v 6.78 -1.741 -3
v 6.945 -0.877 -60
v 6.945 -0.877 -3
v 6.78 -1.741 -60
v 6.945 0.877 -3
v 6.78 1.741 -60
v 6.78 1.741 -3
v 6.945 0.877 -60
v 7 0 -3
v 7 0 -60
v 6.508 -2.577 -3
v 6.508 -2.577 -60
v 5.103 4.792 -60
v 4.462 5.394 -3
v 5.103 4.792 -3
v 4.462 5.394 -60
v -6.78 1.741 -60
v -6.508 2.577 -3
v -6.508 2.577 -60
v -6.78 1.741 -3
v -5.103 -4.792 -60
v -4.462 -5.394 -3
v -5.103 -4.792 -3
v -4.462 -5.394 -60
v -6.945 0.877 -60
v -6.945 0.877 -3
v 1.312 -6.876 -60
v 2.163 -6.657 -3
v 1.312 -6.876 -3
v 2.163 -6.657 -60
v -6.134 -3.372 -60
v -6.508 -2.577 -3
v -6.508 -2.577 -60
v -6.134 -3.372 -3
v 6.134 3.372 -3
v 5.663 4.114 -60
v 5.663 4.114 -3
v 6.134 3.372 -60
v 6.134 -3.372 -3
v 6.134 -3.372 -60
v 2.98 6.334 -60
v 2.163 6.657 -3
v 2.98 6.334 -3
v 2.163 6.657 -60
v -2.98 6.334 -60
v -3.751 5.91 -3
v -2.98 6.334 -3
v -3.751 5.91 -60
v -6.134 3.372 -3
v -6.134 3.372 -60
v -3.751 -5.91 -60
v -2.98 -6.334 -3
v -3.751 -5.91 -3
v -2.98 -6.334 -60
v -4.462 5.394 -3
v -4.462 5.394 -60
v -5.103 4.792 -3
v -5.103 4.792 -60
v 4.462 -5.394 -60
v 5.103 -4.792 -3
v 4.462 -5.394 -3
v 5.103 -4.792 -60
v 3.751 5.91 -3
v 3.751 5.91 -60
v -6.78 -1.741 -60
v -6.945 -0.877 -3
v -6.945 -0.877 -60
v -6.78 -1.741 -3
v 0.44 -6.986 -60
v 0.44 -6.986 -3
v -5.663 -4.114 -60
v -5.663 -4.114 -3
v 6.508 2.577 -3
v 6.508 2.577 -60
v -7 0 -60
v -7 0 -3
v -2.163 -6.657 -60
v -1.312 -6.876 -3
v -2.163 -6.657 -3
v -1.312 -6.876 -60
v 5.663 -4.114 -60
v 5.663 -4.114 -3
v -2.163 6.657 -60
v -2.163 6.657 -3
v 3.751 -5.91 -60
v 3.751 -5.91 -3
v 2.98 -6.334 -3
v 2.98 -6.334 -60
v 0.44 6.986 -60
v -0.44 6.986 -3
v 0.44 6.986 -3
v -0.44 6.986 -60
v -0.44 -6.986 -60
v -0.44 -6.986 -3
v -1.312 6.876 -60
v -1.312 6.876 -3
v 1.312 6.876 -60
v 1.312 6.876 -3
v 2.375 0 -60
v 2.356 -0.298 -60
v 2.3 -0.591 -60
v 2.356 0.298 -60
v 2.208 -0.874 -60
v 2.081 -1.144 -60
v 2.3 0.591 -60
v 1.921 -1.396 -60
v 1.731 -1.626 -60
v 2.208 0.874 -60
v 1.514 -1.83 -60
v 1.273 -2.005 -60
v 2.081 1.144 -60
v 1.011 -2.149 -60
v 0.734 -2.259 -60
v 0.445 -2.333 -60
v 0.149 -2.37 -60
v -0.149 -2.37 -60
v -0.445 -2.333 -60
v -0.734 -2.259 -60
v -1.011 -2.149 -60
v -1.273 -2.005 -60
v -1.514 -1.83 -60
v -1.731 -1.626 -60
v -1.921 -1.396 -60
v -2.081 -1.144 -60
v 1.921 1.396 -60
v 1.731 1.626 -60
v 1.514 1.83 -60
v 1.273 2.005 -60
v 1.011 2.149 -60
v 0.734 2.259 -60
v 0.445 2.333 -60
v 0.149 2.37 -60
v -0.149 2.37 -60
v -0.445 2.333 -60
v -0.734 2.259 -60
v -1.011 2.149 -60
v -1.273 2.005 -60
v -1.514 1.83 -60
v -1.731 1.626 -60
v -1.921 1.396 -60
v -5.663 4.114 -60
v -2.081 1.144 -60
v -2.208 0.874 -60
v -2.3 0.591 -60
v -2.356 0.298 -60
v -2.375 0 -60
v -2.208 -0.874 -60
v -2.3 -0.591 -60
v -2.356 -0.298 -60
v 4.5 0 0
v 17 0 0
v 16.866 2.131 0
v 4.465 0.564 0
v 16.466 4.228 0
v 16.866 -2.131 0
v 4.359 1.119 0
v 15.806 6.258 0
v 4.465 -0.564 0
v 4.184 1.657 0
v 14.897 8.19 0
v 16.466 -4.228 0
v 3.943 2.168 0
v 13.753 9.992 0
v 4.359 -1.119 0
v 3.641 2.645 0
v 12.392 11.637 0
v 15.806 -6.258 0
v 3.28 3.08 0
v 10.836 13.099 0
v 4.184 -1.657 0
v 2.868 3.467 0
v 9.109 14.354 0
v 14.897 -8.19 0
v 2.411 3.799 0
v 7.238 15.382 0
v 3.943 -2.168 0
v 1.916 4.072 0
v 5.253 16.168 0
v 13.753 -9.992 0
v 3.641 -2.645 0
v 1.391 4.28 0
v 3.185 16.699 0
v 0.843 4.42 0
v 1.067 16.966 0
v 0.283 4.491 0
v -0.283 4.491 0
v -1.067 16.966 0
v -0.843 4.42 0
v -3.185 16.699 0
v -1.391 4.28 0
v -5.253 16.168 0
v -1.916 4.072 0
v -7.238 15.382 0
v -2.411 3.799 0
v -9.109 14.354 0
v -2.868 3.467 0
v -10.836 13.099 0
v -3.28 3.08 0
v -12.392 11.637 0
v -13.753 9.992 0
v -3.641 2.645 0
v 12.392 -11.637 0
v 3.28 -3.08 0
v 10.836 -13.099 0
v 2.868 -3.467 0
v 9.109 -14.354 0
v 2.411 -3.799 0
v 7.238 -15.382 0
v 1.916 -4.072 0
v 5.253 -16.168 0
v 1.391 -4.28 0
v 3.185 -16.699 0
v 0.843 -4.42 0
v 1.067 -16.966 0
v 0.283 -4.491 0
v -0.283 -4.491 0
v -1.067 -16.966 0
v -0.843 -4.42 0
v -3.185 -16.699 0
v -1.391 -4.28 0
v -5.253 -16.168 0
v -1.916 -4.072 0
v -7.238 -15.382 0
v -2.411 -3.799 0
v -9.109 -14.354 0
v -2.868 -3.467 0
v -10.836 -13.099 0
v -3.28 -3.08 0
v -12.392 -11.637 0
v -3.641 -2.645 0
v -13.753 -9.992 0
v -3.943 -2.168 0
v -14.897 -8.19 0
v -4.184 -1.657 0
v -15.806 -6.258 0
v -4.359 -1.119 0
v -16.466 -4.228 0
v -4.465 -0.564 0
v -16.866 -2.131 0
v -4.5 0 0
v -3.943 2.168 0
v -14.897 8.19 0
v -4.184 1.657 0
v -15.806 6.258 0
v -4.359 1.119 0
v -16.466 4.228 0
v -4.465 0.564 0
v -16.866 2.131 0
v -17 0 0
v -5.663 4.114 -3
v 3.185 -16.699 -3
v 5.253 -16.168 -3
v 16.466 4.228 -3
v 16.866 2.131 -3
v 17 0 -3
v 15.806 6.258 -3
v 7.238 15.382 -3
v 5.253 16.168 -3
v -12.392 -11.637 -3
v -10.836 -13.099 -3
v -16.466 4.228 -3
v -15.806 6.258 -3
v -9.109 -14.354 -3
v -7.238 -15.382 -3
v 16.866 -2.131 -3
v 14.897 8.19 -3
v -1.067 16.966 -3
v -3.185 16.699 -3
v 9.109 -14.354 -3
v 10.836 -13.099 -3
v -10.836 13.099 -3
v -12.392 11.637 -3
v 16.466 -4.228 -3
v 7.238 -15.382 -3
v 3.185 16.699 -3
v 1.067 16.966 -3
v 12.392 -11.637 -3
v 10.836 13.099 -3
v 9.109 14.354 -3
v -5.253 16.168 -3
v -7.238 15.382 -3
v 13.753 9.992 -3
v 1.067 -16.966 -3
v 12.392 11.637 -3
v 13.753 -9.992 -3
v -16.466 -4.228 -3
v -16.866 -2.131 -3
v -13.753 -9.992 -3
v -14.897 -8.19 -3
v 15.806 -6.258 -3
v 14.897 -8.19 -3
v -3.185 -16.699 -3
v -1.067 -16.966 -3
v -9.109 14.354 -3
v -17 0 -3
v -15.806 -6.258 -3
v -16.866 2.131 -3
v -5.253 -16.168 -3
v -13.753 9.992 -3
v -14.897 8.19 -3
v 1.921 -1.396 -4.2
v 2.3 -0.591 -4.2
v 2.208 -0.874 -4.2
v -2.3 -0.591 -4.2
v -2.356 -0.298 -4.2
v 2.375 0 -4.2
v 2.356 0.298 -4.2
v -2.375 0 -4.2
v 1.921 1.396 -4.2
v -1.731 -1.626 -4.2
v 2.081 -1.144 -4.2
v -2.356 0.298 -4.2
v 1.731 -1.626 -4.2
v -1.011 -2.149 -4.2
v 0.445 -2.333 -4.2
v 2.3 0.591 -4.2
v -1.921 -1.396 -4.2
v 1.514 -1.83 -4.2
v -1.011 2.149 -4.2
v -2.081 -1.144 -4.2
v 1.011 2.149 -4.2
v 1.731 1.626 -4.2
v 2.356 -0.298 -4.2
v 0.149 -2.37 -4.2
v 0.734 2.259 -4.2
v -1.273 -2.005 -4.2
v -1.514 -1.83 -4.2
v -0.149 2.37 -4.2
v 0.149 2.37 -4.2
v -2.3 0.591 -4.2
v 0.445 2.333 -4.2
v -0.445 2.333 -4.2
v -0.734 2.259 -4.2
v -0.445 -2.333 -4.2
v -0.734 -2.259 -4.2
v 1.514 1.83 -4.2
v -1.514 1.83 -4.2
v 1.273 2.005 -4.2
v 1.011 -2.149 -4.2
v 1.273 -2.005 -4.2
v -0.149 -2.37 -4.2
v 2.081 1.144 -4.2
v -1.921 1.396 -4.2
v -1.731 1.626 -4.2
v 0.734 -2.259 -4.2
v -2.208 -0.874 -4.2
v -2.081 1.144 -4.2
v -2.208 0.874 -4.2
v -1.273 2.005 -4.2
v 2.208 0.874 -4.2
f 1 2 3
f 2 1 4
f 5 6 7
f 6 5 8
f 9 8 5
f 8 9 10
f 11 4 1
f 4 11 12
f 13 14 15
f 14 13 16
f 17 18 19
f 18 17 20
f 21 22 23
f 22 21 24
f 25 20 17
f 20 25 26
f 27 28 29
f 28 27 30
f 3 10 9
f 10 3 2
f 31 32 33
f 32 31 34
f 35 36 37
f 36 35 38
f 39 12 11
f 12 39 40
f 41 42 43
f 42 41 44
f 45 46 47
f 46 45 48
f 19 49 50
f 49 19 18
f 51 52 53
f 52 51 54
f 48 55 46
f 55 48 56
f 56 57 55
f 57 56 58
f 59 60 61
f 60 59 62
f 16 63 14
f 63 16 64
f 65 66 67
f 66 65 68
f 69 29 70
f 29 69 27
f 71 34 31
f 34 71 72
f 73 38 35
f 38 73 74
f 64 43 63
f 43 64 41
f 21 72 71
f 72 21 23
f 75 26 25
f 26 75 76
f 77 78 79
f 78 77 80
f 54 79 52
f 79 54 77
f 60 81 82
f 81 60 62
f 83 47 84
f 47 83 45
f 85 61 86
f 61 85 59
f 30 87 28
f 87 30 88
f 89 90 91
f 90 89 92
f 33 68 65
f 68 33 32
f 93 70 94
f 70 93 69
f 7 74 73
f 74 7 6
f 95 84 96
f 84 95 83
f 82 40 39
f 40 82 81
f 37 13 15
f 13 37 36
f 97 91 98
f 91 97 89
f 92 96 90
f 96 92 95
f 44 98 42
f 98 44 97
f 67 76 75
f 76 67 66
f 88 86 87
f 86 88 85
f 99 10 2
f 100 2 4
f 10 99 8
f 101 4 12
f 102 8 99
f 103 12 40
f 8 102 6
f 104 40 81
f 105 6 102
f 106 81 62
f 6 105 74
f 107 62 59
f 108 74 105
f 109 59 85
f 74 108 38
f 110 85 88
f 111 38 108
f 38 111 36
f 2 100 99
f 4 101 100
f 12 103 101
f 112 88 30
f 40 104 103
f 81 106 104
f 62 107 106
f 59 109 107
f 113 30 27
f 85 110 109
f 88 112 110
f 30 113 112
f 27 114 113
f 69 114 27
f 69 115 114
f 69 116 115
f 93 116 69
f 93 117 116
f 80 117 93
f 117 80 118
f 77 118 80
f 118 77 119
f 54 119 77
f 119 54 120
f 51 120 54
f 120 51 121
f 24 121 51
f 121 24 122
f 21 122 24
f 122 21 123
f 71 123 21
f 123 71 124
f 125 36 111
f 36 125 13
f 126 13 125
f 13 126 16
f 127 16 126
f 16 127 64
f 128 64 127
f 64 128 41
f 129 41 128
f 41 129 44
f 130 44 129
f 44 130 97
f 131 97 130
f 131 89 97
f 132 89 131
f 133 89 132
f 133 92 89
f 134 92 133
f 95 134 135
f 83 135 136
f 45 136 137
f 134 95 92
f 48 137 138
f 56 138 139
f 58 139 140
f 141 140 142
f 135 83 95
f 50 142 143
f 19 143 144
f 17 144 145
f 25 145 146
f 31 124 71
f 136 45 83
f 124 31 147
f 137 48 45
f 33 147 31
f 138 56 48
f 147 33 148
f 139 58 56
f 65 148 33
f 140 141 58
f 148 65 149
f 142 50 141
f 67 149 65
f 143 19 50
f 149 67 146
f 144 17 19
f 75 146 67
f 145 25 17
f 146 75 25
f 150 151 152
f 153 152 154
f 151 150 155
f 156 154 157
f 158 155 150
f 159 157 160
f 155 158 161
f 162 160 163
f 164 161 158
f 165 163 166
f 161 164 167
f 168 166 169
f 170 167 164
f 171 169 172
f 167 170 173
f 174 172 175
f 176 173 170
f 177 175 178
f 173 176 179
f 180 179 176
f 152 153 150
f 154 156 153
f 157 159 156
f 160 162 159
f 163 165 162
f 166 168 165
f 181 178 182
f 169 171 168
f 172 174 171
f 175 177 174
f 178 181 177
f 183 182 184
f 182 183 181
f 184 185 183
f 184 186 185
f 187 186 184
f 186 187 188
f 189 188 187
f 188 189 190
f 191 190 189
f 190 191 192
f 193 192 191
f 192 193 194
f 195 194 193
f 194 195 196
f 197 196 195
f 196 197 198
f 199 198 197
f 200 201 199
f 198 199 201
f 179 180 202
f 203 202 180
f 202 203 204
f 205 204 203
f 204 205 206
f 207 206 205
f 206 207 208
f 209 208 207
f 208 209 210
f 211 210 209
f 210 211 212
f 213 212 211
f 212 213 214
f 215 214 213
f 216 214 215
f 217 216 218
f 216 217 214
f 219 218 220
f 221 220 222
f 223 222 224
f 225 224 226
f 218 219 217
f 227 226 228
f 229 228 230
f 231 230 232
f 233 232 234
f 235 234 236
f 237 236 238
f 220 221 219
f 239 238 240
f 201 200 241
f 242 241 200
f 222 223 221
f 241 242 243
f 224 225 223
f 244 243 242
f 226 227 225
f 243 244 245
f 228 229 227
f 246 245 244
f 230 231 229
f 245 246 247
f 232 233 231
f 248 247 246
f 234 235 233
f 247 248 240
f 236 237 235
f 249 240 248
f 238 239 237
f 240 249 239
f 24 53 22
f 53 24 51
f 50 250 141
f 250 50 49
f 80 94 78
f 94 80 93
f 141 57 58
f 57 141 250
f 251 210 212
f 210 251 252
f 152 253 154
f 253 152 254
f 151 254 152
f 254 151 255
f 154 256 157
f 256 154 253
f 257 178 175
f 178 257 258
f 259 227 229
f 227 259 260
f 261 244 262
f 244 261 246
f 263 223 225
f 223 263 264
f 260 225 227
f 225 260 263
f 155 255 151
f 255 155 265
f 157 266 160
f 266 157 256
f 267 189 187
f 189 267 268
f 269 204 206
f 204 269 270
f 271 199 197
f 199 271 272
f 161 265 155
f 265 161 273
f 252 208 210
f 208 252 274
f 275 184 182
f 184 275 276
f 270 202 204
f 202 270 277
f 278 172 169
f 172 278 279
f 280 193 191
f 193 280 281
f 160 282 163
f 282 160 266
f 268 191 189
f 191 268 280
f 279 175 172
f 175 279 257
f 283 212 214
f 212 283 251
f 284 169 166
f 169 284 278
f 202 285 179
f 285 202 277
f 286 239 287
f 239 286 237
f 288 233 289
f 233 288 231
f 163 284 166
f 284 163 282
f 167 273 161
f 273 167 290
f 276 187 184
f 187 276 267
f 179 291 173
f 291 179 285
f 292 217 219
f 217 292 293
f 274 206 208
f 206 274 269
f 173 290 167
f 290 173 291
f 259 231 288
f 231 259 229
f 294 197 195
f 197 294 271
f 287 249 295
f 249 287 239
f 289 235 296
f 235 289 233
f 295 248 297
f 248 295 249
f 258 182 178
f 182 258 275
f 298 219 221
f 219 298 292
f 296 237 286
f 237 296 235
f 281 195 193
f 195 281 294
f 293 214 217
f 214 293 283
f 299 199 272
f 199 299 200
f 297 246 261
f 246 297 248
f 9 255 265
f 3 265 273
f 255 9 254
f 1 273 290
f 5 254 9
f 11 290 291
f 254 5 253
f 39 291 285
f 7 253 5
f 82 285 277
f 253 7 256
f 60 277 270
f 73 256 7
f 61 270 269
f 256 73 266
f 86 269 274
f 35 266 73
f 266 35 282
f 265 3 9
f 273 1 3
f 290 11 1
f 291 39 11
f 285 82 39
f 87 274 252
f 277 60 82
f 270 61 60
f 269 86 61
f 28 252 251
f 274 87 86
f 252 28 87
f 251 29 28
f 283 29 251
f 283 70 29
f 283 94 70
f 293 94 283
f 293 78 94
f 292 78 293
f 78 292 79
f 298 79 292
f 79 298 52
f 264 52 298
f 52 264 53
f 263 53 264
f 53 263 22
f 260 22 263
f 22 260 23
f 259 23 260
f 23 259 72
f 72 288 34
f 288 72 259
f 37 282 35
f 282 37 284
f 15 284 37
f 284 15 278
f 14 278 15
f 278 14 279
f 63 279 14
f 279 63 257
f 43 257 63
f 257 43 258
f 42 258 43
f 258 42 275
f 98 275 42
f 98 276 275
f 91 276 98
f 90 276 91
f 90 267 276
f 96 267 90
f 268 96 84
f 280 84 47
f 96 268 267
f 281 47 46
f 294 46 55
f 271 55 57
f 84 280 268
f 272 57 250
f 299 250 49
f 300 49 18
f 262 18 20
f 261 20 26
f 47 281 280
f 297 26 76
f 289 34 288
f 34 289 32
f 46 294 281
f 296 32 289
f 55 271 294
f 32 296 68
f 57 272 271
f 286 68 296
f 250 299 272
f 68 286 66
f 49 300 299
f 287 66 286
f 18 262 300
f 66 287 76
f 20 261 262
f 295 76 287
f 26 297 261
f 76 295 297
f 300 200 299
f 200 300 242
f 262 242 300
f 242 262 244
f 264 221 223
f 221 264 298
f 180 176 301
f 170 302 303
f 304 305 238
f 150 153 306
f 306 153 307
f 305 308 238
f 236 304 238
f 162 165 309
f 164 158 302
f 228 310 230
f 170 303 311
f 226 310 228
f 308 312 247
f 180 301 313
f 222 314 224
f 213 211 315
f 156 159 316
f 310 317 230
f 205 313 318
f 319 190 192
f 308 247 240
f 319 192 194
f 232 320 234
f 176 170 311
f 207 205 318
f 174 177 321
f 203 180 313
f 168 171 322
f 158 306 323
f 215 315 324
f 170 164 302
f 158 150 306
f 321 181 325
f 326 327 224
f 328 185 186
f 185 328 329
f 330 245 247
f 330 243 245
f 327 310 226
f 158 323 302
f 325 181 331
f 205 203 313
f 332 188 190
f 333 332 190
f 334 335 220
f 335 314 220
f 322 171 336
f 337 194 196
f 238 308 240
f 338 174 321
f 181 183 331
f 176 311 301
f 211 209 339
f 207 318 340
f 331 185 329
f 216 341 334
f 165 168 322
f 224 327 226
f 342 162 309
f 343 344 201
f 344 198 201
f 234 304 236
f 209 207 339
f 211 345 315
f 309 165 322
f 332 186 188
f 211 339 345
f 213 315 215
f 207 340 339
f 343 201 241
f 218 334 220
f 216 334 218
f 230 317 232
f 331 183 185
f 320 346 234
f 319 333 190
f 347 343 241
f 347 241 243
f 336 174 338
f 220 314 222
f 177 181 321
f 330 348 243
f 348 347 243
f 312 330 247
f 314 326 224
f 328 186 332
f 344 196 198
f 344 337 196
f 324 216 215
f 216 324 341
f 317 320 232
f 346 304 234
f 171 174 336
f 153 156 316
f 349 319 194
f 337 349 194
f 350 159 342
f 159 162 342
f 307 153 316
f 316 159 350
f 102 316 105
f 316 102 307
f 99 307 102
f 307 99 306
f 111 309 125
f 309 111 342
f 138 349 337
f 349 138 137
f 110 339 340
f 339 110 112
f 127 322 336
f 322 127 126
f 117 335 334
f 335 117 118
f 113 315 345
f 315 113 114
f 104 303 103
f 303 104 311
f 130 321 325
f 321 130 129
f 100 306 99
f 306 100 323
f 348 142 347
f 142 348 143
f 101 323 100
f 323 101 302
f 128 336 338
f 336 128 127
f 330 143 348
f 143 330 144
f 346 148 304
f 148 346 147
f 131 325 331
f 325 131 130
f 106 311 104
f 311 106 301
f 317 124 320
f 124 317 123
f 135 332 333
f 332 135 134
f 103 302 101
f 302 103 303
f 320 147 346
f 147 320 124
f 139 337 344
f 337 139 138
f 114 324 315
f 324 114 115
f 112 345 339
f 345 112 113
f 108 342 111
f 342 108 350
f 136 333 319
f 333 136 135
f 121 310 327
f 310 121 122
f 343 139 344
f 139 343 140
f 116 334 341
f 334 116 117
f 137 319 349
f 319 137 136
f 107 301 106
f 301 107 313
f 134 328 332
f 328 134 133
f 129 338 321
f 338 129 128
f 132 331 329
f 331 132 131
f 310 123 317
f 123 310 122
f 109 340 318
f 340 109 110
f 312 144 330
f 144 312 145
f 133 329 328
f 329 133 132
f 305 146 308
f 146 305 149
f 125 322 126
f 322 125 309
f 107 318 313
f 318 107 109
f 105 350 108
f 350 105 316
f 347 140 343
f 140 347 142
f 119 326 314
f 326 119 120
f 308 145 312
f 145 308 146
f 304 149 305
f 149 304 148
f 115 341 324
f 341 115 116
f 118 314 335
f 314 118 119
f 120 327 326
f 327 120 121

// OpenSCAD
$fn = 50;


difference() {
	union() {
		translate(v = [0, 0, -60.0000000000]) {
			cylinder(h = 60, r = 7.0000000000);
		}
		translate(v = [0, 0, -3.0000000000]) {
			cylinder(h = 3, r = 17.0000000000);
		}
	}
	union() {
		translate(v = [0, 0, 0]) {
			rotate(a = [0, 0, 0]) {
				difference() {
					union() {
						#translate(v = [0, 0, -60.0000000000]) {
							cylinder(h = 60, r = 2.2500000000);
						}
						#translate(v = [0, 0, -4.2000000000]) {
							cylinder(h = 4.2000000000, r1 = 2.3750000000, r2 = 4.5000000000);
						}
						#translate(v = [0, 0, -60.0000000000]) {
							cylinder(h = 60, r = 2.3750000000);
						}
						#translate(v = [0, 0, -60.0000000000]) {
							cylinder(h = 60, r = 2.2500000000);
						}
					}
					union();
				}
			}
		}
	}
}
